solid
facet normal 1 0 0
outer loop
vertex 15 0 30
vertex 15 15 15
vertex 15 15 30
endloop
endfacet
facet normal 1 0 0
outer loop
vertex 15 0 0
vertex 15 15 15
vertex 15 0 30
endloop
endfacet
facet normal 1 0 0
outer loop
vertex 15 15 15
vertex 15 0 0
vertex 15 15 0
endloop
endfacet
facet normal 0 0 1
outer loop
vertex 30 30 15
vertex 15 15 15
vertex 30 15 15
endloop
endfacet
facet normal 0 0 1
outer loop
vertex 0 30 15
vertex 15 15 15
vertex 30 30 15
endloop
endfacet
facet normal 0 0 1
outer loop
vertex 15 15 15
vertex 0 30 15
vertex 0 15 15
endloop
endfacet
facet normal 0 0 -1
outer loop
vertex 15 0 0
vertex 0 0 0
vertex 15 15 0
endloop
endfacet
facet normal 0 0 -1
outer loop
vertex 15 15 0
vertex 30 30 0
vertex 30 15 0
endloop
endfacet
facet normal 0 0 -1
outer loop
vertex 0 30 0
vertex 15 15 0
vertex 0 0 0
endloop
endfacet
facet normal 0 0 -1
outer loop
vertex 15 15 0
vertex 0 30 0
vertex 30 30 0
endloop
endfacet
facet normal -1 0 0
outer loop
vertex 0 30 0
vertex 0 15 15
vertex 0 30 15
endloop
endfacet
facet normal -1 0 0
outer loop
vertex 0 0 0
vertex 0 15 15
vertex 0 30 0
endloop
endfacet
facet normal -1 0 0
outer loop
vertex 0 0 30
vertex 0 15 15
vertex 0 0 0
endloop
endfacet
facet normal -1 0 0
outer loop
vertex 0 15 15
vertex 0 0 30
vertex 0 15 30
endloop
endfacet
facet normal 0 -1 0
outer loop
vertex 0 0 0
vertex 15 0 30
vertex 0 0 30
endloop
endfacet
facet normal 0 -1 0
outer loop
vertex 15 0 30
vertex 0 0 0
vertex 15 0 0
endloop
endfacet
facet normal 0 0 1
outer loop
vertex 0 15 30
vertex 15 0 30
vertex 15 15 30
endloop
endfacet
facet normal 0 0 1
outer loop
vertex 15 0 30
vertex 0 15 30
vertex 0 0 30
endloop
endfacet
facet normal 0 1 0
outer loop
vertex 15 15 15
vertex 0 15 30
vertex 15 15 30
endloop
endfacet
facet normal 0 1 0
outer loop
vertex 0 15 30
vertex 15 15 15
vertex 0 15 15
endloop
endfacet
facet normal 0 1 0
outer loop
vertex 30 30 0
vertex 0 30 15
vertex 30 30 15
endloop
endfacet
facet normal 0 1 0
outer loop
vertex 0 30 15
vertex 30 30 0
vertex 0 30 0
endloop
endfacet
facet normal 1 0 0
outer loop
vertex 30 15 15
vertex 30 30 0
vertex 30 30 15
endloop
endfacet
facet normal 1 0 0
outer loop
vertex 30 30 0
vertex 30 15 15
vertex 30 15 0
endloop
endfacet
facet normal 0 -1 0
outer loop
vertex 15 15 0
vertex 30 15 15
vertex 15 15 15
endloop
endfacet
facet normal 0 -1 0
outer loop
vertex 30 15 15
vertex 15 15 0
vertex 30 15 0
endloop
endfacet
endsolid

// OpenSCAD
// Fongo piece 10: Tripod. GPL-3.0; see README.txt.
// All cube positions derive from the canonical catalogue. z points up.
unit = 15; // mm, scale all pieces AND cards together
positions = [[0,0,0],[0,0,1],[0,1,0],[1,1,0]];
union() { for (p = positions) translate(p * unit) cube([unit, unit, unit]); }
